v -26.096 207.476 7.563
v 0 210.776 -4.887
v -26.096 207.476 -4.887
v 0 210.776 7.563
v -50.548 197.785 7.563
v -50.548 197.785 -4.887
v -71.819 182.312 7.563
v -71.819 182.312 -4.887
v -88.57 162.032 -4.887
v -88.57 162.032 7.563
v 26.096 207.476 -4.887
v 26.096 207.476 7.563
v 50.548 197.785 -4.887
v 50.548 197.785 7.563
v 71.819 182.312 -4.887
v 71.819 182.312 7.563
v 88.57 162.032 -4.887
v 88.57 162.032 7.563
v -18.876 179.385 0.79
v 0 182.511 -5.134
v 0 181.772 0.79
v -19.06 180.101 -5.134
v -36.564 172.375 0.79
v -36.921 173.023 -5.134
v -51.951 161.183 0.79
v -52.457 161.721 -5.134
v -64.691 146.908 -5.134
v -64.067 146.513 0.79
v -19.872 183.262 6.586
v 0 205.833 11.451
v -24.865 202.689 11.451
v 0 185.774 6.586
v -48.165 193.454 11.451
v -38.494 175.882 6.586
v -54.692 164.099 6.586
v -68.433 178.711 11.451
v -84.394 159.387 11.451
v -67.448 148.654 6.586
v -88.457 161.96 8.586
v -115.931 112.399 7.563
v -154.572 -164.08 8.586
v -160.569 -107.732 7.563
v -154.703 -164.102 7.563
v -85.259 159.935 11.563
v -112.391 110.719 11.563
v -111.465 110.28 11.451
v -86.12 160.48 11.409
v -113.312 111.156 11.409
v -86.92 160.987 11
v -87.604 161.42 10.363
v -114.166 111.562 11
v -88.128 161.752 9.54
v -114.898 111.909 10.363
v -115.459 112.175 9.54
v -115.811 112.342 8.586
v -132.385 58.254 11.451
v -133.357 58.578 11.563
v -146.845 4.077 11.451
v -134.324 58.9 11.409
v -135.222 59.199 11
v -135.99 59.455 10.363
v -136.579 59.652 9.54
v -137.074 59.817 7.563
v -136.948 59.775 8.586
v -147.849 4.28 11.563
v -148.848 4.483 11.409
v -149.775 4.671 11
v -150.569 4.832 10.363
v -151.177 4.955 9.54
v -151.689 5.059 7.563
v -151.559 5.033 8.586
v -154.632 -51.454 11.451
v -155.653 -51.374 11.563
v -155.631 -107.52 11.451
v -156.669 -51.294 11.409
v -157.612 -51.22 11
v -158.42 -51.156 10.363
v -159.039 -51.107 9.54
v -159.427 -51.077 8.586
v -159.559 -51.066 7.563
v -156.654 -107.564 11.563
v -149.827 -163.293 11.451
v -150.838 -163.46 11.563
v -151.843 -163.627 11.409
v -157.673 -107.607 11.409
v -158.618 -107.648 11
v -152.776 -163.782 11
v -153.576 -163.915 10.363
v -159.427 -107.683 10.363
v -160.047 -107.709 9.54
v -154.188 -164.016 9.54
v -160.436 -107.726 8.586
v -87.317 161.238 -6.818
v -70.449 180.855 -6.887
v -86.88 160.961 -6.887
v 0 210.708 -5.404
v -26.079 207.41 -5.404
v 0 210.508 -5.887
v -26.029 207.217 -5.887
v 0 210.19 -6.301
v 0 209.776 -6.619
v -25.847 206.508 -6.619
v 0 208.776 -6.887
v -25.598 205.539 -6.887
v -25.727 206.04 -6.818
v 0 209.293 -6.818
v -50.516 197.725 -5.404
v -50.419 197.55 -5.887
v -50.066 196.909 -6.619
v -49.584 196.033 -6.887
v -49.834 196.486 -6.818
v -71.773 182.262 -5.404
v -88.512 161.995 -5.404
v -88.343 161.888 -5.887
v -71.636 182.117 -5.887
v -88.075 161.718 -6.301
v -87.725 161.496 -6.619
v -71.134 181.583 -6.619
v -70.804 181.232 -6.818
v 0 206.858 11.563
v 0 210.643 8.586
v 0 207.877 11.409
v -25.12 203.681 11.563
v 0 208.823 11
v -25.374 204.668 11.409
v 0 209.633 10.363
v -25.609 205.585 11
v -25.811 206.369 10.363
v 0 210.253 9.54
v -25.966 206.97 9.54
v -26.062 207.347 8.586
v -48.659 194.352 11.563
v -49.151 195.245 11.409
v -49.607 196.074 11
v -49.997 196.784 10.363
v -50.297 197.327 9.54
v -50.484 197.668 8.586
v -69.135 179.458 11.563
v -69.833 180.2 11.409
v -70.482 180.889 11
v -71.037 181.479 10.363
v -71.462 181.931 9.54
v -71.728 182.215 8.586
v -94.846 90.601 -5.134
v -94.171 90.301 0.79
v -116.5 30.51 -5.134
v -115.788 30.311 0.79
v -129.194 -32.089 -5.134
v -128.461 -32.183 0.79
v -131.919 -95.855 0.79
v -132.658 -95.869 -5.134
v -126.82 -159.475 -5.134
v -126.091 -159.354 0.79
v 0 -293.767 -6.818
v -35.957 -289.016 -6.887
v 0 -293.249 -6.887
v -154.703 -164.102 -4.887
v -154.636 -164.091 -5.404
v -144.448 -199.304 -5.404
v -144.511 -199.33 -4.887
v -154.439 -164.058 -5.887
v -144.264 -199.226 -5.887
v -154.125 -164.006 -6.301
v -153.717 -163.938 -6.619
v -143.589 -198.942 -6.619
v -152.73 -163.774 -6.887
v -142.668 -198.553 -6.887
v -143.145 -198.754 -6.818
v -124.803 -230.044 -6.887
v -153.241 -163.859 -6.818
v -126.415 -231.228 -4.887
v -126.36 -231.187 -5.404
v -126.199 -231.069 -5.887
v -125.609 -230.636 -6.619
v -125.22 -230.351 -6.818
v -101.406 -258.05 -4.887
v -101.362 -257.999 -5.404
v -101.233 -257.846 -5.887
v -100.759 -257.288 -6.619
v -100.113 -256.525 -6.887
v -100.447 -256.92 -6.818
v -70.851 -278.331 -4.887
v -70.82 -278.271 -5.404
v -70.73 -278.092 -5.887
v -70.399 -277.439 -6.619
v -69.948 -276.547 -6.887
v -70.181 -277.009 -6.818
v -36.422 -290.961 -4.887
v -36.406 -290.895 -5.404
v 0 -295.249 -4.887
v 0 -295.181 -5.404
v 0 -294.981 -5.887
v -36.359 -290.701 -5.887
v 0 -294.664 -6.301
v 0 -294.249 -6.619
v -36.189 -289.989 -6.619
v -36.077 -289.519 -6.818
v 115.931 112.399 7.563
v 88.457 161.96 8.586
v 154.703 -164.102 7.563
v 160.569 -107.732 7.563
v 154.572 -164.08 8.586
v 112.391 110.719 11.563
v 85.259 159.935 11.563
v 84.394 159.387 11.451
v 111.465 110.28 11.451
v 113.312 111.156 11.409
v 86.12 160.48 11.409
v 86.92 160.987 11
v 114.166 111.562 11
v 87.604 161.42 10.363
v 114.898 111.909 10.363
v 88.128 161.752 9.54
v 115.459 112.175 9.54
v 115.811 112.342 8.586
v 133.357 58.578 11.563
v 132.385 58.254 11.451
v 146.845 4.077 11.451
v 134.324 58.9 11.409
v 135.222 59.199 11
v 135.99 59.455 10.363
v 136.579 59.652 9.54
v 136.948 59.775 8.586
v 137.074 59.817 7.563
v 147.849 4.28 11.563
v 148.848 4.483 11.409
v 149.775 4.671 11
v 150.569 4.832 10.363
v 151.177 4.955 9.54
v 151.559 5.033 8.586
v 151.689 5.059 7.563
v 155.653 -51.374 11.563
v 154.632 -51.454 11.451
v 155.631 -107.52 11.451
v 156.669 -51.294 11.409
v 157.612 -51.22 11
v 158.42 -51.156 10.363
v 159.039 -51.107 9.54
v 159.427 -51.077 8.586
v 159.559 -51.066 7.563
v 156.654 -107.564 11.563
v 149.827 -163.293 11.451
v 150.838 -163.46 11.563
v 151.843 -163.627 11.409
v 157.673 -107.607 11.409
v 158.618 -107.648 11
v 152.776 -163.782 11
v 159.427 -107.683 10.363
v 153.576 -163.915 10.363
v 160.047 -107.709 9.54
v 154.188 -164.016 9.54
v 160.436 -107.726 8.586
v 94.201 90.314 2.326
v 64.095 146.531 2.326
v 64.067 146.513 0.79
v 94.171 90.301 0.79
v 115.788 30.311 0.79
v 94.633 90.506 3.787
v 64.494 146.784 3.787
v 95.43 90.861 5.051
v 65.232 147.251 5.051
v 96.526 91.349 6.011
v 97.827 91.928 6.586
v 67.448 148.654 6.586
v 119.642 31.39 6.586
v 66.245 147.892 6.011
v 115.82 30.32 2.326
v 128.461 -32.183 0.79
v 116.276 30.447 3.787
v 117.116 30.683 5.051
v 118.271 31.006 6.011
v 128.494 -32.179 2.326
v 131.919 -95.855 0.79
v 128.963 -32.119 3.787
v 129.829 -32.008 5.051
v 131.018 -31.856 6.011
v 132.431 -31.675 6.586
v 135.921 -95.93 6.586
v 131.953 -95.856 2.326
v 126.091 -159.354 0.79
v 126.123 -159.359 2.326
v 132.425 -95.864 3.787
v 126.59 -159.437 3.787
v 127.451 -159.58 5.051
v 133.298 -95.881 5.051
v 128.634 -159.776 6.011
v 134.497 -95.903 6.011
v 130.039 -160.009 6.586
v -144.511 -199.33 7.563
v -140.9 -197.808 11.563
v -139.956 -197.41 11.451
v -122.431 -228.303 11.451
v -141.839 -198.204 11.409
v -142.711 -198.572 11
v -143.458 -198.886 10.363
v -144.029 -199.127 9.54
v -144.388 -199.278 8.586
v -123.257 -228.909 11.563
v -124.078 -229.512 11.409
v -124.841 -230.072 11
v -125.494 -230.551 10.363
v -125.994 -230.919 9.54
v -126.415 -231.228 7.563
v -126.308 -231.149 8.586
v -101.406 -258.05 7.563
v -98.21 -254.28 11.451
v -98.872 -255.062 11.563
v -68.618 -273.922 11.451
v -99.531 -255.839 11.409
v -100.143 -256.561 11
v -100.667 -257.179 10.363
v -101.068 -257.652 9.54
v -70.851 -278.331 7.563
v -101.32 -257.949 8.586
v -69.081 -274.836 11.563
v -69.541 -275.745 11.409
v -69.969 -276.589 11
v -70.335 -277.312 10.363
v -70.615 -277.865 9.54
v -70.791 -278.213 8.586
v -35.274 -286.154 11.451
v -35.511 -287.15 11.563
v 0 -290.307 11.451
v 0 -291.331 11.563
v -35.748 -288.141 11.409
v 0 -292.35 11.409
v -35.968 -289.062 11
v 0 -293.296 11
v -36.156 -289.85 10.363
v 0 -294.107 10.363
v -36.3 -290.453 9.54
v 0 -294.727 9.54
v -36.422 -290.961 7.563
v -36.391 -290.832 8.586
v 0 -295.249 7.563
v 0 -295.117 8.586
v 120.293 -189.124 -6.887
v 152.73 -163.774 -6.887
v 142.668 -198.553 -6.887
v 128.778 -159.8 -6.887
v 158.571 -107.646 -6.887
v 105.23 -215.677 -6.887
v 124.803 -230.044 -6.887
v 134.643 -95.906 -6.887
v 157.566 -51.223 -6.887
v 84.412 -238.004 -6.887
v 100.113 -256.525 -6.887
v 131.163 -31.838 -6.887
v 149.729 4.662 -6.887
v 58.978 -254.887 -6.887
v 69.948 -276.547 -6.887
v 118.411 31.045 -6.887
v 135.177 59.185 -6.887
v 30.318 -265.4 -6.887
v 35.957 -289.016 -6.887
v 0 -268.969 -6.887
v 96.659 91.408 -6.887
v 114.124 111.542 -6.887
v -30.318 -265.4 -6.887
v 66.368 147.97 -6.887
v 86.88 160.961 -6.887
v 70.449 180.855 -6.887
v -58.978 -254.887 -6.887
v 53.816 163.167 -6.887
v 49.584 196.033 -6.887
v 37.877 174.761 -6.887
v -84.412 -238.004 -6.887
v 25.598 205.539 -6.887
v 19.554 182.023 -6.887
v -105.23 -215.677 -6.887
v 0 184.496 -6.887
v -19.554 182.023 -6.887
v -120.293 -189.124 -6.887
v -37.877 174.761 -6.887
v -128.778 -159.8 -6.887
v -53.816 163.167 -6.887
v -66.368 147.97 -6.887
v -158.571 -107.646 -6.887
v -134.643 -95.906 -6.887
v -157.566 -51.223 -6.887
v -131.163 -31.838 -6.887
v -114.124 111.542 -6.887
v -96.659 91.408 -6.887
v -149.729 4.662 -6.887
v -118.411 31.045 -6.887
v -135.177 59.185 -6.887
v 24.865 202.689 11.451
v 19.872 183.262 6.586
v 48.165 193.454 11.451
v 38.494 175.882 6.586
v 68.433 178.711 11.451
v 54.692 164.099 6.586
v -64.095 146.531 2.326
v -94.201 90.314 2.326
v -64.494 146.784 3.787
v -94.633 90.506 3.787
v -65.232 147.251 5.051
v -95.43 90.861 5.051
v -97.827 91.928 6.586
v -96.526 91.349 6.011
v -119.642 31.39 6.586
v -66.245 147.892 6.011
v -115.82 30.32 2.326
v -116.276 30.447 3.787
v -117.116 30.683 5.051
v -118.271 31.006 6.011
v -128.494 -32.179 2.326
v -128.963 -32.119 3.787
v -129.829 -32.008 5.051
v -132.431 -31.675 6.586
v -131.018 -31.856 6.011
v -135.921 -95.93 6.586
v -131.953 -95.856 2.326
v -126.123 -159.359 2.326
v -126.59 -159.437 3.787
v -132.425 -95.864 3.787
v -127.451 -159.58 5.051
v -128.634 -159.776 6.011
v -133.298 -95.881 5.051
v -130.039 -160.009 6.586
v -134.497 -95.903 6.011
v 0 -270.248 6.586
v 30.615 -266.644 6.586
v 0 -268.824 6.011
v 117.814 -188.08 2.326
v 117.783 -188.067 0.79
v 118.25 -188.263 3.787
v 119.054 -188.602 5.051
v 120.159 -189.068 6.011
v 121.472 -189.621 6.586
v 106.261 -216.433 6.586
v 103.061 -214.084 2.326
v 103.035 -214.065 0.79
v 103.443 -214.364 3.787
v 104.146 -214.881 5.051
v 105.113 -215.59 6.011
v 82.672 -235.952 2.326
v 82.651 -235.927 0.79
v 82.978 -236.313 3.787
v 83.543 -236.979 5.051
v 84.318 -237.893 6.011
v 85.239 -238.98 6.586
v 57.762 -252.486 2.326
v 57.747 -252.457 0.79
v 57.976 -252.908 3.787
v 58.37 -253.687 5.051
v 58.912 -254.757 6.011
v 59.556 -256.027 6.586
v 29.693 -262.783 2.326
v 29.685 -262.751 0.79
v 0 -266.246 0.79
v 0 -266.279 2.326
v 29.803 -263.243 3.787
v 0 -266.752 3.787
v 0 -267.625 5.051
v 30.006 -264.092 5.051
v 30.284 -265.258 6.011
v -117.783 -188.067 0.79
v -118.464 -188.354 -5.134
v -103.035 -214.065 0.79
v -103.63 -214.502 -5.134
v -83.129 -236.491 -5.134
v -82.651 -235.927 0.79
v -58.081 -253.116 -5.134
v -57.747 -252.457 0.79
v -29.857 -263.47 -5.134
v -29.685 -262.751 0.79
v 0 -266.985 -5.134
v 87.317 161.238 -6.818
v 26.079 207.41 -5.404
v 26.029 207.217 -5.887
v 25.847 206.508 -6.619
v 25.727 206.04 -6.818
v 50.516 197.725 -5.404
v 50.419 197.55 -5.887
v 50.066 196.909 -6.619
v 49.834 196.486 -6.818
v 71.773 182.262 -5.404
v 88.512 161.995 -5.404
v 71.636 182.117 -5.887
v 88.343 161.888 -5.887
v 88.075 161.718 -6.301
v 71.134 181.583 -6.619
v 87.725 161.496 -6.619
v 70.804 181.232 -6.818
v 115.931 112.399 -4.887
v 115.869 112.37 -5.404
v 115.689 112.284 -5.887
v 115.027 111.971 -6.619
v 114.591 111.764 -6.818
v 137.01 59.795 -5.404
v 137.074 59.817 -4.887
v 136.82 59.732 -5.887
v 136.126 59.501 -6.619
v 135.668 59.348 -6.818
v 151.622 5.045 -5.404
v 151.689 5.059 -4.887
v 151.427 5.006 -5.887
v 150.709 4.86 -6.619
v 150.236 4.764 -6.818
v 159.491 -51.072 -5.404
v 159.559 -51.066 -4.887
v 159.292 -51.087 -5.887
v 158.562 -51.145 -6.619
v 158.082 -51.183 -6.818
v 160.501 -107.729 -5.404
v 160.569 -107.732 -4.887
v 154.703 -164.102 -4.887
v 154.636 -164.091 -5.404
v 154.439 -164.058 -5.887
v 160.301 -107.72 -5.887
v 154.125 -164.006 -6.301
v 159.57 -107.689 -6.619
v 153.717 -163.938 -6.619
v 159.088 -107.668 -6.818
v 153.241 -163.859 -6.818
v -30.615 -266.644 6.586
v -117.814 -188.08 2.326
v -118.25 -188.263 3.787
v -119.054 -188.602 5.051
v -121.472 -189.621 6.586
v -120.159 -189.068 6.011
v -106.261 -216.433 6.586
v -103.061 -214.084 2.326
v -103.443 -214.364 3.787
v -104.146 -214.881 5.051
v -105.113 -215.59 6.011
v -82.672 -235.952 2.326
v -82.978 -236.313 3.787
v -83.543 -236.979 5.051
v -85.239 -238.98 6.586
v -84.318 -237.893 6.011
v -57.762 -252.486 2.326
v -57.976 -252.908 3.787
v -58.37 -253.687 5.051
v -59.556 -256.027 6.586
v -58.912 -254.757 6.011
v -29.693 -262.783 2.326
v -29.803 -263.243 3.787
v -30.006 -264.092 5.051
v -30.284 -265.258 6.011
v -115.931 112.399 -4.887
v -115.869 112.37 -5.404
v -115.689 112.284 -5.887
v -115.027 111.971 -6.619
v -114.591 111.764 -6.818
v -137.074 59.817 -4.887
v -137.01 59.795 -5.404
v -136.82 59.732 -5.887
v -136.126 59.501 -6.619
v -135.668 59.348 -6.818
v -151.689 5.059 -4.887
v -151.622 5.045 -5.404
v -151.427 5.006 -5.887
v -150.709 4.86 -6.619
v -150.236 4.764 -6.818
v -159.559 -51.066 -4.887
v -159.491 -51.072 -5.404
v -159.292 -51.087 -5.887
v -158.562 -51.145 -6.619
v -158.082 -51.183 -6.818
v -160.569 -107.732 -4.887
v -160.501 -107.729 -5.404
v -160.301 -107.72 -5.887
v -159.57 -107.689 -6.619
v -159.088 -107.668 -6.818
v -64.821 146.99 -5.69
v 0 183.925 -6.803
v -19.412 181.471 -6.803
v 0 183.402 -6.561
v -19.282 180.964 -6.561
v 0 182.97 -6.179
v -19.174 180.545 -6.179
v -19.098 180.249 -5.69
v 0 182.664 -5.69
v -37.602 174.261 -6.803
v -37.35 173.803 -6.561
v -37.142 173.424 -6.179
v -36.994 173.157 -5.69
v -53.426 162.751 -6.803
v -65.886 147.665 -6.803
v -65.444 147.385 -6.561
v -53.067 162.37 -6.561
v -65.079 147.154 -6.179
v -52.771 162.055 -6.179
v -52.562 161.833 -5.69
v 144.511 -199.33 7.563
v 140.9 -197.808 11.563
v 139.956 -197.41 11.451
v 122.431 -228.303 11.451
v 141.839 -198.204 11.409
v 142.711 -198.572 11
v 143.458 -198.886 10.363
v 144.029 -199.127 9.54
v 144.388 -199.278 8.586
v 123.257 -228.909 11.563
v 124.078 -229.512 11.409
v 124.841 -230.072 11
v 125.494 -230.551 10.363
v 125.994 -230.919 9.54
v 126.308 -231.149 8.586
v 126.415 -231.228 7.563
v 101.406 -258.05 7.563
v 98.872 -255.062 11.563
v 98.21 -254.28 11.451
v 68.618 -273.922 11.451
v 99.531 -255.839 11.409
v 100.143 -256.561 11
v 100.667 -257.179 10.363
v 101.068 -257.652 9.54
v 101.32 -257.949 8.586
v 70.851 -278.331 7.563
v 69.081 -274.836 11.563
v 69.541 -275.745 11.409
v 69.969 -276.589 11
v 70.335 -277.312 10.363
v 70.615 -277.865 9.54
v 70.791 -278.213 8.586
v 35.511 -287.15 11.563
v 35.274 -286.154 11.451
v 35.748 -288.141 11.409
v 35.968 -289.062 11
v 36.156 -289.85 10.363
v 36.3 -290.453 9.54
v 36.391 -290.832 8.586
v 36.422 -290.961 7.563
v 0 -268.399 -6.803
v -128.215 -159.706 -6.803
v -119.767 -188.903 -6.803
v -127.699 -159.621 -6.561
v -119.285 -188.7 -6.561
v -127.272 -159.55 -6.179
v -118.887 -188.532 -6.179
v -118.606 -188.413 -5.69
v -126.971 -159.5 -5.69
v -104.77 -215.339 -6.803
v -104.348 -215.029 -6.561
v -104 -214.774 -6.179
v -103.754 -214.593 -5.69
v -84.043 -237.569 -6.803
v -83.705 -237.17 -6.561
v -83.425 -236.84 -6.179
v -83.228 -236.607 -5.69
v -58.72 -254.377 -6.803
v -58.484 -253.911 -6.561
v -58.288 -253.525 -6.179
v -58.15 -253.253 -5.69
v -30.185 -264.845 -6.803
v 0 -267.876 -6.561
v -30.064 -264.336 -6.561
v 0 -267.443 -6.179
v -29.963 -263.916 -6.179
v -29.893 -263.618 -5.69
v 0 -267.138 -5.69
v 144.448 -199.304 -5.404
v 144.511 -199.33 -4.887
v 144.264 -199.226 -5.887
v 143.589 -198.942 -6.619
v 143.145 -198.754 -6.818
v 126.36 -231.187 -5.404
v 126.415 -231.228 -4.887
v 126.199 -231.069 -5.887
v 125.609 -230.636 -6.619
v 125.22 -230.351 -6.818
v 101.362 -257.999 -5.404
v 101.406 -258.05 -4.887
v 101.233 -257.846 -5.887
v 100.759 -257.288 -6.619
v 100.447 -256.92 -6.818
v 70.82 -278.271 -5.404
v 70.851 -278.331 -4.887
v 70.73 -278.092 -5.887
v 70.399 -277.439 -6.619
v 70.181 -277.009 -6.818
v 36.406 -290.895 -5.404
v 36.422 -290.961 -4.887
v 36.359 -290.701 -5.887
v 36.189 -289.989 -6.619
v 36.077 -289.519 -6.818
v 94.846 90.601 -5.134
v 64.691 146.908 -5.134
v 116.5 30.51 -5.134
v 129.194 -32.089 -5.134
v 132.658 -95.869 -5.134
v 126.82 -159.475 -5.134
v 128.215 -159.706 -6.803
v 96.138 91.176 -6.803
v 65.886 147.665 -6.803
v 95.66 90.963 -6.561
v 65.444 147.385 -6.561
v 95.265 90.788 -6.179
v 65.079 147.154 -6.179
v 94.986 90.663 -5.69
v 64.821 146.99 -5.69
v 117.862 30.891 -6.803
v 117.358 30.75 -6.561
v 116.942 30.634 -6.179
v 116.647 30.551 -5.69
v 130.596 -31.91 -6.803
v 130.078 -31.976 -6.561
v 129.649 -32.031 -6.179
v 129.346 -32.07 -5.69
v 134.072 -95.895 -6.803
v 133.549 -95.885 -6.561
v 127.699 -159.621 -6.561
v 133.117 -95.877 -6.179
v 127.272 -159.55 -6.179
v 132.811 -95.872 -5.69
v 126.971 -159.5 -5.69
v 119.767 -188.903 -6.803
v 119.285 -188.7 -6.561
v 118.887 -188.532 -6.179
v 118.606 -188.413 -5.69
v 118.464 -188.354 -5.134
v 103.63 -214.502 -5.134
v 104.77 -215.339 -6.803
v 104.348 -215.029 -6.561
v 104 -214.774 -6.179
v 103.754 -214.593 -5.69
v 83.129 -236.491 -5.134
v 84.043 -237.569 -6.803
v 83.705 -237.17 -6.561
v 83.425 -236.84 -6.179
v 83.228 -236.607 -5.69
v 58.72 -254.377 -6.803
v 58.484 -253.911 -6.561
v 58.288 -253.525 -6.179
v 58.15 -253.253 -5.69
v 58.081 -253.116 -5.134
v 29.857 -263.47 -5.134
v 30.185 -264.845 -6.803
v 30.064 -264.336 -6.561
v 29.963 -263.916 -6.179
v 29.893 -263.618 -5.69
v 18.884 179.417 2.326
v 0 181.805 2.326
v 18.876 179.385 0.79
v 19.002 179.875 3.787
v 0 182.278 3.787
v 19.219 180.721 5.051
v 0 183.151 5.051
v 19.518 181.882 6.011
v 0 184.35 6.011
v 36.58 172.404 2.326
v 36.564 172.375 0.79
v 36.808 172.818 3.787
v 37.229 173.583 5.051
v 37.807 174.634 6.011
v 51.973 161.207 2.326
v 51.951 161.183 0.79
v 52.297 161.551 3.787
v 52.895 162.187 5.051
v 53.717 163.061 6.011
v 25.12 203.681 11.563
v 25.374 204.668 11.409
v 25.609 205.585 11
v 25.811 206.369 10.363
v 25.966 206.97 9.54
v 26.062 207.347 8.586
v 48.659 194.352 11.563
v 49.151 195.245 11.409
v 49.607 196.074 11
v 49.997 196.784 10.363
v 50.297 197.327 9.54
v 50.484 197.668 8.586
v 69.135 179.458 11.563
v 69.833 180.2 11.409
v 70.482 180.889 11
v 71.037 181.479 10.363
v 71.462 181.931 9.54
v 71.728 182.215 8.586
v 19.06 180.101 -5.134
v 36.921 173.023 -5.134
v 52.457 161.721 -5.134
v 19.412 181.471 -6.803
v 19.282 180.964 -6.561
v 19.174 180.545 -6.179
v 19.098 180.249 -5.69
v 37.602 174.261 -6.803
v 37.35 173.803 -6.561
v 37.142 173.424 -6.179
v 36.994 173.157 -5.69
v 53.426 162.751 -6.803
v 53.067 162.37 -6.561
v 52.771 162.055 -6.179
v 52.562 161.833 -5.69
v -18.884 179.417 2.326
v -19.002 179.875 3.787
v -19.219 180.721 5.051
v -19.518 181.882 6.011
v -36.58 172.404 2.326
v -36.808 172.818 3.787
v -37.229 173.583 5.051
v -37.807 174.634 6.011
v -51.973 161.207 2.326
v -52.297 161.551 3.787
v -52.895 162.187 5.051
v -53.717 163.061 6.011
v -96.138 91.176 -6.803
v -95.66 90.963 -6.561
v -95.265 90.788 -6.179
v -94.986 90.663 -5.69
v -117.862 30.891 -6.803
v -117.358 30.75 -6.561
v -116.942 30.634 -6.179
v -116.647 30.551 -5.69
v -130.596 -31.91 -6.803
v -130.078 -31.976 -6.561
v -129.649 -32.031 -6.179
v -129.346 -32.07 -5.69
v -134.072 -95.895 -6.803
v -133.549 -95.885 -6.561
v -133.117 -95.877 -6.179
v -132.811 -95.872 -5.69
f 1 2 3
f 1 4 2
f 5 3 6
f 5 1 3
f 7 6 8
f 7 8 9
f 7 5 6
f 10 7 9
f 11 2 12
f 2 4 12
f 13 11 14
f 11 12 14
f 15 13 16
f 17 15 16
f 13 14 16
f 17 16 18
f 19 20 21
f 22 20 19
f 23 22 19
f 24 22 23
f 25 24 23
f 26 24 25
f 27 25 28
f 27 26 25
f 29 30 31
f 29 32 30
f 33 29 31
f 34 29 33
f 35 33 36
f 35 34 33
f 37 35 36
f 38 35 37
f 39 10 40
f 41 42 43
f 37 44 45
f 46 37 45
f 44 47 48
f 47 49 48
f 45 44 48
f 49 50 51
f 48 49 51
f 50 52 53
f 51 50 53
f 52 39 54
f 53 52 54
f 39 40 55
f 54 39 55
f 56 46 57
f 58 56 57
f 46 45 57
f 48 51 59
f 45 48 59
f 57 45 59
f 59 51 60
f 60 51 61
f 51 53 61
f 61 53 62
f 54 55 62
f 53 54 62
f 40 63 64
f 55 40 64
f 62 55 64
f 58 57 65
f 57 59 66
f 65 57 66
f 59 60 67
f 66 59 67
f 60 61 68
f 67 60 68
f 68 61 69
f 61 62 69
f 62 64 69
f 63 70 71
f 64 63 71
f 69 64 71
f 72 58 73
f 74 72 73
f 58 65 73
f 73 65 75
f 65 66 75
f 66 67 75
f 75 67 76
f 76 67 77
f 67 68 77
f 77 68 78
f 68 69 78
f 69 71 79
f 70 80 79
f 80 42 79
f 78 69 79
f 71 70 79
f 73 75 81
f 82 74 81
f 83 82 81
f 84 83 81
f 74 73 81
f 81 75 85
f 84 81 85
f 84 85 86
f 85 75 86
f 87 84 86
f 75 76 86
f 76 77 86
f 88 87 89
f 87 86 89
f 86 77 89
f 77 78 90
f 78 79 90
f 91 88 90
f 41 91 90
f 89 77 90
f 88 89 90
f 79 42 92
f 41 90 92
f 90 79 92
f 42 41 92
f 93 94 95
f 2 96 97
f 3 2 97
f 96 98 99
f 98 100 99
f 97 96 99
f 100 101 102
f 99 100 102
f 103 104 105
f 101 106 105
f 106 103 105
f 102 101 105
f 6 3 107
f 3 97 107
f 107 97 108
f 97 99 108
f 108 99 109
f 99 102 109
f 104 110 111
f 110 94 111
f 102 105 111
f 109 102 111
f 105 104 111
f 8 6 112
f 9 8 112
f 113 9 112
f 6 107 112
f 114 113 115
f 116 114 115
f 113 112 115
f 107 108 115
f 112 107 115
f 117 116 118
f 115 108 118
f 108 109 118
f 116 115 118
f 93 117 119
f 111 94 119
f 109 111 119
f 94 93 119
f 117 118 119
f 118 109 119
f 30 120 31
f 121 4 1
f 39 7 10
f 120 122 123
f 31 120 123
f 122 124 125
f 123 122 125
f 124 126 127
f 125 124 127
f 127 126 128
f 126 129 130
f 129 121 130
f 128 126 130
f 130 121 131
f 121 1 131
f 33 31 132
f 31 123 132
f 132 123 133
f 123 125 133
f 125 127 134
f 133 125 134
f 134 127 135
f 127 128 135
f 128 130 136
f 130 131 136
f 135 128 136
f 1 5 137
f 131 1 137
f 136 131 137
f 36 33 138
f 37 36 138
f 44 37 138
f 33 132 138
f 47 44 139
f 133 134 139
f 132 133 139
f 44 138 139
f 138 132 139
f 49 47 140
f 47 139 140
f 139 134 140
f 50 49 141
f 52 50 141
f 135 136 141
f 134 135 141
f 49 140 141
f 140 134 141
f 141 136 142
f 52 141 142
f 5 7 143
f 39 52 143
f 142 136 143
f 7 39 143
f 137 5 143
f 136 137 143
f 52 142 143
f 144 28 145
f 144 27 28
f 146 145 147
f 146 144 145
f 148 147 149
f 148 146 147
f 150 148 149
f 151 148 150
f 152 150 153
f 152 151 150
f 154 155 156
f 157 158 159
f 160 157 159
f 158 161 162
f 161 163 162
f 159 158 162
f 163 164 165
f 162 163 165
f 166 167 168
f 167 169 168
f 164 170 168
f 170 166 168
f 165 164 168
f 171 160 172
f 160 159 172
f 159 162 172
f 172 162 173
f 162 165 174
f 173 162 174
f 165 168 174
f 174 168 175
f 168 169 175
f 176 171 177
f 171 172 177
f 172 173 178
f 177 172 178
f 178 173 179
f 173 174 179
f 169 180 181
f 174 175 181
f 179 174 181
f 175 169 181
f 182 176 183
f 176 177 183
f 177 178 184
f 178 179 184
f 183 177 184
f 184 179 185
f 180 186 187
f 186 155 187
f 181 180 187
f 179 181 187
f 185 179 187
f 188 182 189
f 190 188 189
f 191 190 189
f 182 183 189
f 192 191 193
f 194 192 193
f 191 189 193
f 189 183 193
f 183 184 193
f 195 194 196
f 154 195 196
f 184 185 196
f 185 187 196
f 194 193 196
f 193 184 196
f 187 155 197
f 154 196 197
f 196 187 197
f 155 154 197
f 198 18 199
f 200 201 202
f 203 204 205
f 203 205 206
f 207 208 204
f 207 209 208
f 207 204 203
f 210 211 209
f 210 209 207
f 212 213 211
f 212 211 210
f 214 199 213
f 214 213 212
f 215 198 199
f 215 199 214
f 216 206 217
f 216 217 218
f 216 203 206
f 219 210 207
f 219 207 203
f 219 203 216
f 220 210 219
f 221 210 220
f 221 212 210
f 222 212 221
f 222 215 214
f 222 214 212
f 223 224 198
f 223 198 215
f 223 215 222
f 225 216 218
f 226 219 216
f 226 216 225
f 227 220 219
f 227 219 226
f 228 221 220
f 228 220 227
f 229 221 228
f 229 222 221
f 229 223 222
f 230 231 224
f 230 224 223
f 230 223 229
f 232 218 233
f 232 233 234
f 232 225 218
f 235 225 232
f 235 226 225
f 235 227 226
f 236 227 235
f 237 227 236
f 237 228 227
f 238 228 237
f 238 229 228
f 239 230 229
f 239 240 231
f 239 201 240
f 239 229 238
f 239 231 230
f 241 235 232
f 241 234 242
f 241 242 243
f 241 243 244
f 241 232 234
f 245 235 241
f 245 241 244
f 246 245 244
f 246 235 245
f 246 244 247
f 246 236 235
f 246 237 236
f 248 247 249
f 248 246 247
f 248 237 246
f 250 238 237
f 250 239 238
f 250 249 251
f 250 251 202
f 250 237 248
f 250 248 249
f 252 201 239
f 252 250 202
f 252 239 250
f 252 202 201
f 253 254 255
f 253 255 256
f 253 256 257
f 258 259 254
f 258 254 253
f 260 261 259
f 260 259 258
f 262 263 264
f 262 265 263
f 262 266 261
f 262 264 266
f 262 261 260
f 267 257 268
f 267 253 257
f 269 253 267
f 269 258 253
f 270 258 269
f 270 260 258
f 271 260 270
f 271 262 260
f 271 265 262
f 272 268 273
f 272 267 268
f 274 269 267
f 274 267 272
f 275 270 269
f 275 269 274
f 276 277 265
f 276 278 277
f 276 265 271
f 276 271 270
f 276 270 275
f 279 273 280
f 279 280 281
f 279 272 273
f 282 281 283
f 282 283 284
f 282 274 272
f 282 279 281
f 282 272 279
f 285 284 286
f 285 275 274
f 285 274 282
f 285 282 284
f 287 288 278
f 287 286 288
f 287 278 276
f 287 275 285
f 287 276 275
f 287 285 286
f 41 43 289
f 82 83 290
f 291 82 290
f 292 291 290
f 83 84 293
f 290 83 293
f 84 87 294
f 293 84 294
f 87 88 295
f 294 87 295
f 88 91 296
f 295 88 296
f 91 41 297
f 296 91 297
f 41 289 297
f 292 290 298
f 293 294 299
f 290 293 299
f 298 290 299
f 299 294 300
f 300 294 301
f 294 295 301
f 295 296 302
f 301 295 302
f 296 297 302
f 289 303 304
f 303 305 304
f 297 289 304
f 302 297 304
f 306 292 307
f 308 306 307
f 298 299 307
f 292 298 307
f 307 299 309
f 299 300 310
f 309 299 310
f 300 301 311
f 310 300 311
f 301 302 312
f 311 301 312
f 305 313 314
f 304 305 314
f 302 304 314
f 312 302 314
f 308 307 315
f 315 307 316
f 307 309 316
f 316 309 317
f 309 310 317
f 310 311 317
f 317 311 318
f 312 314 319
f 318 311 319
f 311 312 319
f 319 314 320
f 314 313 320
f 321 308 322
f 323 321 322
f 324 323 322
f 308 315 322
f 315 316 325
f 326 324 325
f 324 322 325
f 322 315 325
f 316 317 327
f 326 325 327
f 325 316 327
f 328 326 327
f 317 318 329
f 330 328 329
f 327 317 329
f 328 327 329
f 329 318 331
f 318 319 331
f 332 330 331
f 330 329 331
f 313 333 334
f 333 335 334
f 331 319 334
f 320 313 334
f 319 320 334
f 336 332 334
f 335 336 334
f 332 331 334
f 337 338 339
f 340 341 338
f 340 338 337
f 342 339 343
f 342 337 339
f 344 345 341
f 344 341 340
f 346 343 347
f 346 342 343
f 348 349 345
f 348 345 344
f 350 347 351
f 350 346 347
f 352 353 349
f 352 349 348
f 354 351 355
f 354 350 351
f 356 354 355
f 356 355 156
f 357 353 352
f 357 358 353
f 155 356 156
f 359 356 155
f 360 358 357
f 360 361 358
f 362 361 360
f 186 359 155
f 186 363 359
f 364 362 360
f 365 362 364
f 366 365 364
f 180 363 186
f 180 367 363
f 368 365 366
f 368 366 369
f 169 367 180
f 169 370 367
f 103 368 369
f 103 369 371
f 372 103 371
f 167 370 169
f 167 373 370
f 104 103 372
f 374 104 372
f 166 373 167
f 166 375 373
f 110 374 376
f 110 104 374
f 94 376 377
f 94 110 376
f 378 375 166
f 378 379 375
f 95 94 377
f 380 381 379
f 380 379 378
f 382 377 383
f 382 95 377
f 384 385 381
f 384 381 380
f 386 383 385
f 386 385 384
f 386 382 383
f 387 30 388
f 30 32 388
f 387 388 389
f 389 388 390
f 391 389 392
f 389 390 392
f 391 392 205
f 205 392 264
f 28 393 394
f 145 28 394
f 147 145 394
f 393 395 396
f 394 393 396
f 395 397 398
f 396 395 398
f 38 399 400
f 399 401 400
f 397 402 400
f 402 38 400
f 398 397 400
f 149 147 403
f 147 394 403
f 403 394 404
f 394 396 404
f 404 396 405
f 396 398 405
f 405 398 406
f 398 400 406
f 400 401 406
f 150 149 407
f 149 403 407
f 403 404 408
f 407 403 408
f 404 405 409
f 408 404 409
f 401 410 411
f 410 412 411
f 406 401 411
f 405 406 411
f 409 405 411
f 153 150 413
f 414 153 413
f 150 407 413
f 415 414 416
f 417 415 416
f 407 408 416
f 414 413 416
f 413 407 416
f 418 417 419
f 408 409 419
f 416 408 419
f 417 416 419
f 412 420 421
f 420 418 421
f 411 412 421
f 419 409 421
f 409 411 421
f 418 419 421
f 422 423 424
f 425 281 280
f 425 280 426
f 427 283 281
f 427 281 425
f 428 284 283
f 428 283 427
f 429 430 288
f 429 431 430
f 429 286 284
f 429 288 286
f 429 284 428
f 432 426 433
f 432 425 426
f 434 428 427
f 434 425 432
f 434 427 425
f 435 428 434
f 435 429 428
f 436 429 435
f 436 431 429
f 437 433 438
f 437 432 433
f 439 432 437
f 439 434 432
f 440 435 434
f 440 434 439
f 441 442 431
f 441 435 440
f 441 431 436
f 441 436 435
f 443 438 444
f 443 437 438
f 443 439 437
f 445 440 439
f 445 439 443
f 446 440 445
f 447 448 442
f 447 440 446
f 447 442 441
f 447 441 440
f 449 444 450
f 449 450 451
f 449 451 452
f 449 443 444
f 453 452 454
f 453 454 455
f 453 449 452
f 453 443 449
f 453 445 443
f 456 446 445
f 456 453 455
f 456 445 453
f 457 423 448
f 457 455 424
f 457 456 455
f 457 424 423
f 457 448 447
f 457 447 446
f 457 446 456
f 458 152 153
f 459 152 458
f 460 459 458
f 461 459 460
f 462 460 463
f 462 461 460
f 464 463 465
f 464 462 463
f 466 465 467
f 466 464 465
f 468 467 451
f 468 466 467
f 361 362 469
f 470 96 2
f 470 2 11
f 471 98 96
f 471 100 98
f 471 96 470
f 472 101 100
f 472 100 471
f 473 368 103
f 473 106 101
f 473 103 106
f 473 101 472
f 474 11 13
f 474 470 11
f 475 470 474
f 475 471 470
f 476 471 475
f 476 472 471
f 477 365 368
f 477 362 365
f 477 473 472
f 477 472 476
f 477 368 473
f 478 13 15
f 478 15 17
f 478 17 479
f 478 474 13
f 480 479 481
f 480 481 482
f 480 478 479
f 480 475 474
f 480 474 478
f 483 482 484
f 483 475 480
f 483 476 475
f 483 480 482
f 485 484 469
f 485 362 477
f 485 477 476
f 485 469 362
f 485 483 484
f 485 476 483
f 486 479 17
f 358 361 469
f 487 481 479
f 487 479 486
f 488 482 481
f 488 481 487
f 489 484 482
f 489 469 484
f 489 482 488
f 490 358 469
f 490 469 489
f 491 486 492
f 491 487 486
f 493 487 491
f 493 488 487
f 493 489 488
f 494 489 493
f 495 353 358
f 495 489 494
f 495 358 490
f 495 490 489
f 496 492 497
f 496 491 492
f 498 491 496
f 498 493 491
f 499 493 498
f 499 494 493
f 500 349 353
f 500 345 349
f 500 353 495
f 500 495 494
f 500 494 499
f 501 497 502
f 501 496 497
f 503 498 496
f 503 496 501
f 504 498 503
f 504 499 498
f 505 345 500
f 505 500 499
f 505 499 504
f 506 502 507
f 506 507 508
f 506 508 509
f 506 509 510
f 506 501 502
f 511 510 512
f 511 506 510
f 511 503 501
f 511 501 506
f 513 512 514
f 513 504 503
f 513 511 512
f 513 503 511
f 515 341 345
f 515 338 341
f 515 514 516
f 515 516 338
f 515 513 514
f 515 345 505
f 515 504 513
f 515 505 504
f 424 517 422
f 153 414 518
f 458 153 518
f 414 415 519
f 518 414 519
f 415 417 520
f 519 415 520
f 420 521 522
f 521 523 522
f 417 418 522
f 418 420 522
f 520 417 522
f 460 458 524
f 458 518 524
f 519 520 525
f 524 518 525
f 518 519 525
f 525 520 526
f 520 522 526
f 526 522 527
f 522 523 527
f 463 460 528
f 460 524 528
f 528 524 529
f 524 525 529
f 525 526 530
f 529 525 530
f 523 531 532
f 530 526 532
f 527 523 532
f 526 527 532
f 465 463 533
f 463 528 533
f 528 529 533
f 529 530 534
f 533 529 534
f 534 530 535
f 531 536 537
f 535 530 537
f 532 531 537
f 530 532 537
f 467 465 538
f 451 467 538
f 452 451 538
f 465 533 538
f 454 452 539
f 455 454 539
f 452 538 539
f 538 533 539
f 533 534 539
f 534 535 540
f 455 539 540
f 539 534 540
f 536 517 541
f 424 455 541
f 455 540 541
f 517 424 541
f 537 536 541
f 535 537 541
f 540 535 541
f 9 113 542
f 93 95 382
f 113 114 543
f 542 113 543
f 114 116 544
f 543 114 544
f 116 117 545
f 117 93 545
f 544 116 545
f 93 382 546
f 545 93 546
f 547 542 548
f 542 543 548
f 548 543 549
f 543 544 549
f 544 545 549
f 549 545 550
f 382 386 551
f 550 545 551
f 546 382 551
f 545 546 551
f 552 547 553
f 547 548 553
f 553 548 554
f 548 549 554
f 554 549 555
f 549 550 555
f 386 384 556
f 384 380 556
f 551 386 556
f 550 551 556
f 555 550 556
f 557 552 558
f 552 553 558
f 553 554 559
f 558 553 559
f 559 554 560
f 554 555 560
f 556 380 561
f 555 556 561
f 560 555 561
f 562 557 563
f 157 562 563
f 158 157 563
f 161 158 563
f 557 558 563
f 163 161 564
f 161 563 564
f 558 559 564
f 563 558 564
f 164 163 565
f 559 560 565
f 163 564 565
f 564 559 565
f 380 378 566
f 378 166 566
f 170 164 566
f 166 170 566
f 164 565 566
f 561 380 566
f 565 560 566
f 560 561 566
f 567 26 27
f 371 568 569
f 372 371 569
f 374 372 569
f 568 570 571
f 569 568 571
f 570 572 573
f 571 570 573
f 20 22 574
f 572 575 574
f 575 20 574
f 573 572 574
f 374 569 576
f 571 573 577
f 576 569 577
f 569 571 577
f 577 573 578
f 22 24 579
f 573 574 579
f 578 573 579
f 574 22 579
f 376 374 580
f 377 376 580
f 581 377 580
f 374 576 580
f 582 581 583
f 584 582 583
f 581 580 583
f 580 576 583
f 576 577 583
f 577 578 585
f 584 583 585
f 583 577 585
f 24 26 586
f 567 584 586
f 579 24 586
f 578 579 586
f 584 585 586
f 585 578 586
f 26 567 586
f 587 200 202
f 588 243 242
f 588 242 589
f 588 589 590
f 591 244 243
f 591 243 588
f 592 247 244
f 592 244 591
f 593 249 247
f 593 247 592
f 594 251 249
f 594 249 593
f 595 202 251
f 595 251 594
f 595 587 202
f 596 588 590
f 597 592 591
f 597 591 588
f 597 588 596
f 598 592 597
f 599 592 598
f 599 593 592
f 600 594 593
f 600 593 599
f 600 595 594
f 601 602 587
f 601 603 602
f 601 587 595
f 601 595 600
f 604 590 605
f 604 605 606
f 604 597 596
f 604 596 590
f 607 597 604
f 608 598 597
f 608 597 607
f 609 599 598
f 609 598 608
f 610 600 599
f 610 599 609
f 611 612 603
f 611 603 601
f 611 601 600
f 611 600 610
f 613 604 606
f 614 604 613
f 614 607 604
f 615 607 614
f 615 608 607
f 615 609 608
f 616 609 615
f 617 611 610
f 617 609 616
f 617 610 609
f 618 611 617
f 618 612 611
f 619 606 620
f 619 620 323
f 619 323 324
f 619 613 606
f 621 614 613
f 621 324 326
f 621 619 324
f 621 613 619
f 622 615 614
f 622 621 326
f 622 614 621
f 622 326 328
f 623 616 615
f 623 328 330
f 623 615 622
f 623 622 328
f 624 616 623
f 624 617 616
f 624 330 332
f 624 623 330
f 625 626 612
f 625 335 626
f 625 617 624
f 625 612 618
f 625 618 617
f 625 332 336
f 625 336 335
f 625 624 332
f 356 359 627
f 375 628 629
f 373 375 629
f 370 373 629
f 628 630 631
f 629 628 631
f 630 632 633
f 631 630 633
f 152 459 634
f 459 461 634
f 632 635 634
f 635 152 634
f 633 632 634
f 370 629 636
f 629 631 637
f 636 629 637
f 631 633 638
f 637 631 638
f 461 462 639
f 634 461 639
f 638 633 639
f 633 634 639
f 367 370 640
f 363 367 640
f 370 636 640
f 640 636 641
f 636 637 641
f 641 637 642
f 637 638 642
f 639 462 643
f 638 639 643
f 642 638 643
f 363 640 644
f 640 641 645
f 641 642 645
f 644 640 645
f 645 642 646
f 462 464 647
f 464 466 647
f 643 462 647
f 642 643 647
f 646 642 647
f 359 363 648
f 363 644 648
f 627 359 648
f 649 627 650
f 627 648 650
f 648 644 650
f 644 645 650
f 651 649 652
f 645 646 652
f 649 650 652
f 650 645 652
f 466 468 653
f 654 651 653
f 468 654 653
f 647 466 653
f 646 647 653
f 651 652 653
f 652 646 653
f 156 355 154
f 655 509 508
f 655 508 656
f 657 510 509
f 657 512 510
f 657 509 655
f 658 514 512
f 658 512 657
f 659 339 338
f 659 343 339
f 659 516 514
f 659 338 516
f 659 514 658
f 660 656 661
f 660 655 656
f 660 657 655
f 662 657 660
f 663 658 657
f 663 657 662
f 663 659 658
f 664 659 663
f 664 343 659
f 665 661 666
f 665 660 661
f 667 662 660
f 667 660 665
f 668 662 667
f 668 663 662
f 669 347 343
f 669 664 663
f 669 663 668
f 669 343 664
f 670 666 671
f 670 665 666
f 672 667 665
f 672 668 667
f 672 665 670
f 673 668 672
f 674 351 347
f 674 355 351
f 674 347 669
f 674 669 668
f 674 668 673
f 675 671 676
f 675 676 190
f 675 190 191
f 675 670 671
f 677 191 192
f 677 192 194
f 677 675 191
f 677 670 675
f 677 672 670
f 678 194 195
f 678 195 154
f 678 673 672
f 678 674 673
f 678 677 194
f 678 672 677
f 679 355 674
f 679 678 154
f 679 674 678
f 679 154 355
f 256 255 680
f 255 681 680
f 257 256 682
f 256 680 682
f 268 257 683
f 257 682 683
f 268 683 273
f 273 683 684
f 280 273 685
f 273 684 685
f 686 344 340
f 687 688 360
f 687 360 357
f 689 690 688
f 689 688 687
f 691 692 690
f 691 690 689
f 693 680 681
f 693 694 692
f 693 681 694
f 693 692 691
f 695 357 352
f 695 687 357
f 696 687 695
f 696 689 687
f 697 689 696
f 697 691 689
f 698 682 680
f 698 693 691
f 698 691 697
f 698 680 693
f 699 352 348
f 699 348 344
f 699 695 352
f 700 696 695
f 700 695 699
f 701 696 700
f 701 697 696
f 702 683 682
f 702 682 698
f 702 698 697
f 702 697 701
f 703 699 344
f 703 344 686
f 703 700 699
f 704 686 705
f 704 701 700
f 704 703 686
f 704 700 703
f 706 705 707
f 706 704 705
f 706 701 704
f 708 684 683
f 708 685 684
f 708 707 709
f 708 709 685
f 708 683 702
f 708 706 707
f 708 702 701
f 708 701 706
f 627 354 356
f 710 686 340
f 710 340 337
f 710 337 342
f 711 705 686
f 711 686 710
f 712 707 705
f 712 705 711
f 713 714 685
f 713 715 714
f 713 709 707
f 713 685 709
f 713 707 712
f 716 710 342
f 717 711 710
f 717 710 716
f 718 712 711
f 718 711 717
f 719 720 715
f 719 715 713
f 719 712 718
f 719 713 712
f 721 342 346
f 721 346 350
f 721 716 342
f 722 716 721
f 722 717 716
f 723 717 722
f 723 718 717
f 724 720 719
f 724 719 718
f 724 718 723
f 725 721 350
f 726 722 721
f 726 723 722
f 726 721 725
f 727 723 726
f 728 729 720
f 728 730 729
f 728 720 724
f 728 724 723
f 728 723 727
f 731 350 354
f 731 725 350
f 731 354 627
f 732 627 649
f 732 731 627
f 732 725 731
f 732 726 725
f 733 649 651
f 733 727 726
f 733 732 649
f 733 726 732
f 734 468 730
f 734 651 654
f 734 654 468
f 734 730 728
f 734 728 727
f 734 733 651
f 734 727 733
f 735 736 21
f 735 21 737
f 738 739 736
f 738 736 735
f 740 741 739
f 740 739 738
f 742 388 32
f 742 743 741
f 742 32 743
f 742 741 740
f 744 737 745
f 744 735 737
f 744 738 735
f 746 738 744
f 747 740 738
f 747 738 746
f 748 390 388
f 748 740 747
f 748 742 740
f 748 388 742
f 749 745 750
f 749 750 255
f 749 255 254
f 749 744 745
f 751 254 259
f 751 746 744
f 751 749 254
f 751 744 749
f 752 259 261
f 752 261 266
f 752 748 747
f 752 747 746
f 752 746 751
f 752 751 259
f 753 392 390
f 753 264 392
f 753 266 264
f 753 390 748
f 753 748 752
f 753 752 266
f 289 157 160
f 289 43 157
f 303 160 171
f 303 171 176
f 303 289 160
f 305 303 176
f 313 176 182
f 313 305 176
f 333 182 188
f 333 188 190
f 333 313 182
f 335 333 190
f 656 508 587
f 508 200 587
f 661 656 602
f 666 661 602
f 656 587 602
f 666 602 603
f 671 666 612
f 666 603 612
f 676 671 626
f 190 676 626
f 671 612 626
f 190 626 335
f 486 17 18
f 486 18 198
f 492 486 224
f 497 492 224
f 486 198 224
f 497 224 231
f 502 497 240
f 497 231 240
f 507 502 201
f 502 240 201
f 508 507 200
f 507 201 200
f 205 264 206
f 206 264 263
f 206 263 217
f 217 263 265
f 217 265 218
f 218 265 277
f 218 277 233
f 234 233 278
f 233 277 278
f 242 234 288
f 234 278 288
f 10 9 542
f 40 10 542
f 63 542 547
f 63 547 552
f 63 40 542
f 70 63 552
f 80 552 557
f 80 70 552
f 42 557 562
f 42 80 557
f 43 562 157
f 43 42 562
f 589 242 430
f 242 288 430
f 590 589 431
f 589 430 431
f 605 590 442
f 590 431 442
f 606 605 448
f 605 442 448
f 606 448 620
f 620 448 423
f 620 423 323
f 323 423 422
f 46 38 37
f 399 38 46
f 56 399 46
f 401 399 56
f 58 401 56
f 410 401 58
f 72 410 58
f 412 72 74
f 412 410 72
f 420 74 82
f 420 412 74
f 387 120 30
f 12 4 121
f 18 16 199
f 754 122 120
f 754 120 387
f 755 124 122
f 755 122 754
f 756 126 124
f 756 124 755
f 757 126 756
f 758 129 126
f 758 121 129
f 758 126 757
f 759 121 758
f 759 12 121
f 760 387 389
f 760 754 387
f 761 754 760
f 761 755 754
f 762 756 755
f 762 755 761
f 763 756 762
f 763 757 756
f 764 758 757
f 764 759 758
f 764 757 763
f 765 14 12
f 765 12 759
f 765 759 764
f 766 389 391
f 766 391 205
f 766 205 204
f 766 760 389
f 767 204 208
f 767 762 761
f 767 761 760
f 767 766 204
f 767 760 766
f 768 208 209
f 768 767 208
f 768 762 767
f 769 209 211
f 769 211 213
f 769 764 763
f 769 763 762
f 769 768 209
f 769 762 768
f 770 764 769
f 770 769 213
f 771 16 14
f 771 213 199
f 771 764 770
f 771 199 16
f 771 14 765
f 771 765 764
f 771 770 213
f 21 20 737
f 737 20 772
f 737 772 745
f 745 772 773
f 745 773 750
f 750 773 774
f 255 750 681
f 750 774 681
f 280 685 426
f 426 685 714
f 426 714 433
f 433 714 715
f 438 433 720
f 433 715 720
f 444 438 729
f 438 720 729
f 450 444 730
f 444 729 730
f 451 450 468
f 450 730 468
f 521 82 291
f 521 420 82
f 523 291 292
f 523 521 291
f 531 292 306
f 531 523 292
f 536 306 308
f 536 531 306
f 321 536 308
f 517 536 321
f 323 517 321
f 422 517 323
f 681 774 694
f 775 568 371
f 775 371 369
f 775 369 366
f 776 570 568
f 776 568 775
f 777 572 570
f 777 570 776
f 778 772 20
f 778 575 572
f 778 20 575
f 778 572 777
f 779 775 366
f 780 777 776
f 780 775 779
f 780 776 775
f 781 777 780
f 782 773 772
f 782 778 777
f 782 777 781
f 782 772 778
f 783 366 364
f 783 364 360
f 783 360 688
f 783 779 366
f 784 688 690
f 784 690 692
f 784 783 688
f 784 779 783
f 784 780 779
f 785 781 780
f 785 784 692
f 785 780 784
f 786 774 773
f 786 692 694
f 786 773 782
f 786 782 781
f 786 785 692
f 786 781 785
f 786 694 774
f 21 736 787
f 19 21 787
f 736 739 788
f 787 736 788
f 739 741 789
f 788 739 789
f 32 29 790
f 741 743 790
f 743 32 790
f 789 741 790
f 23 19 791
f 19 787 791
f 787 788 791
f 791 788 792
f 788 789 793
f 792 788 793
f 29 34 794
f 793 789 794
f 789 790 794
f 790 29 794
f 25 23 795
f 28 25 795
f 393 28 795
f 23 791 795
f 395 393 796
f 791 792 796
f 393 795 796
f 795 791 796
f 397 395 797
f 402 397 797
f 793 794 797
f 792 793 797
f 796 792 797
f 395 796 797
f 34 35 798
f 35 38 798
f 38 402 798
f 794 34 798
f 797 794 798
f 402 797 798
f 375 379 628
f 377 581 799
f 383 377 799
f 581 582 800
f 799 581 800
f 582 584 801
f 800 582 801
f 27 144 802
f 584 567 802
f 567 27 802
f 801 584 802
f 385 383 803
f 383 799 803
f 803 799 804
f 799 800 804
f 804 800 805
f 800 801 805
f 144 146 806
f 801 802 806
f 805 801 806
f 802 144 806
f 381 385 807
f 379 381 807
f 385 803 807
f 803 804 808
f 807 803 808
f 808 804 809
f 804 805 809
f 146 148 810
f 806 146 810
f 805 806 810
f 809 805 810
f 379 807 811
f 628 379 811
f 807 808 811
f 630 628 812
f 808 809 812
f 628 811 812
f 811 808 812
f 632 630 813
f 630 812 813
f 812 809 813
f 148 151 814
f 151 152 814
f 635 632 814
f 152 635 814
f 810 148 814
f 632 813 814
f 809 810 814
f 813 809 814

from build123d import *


with BuildPart() as part:
    # AdditivePipe: sweep along a path in Sketch001
    with BuildLine(Plane.XY) as additivepipe_path:
        ThreePointArc((0, 198.761814), (44.755859, 187.259569), (78.420015, 155.603397))
        ThreePointArc((78.420015, 155.603397), (139.914866, 2.671428), (142.851191, -162.135071))
        ThreePointArc((142.851191, -162.135071), (93.637273, -248.886362), (0, -283.235413))
    # Sketch → AdditivePipe (sweep)
    with BuildSketch(Plane.YZ):
        with BuildLine():
            Line((184.49577, -6.886511), (208.77577, -6.886511))
            ThreePointArc((208.77577, -6.886511), (210.189983, -6.300724), (210.77577, -4.886511))
            Line((210.77577, -4.886511), (210.77577, 7.563489))
            ThreePointArc((210.77577, 7.563489), (209.248492, 10.707634), (205.832946, 11.450787))
            Line((205.832946, 11.450787), (185.77449, 6.585816))
            ThreePointArc((185.77449, 6.585816), (182.668433, 4.45086), (181.772069, 0.789963))
            Line((181.772069, 0.789963), (182.511156, -5.134111))
            ThreePointArc((182.511156, -5.134111), (183.171987, -6.38571), (184.49577, -6.886511))
        make_face()
    additivepipe = sweep(path=additivepipe_path.line)

    # Mirrored: AdditivePipe across YZ
    add(additivepipe.mirror(Plane.YZ))


solid = part.part
